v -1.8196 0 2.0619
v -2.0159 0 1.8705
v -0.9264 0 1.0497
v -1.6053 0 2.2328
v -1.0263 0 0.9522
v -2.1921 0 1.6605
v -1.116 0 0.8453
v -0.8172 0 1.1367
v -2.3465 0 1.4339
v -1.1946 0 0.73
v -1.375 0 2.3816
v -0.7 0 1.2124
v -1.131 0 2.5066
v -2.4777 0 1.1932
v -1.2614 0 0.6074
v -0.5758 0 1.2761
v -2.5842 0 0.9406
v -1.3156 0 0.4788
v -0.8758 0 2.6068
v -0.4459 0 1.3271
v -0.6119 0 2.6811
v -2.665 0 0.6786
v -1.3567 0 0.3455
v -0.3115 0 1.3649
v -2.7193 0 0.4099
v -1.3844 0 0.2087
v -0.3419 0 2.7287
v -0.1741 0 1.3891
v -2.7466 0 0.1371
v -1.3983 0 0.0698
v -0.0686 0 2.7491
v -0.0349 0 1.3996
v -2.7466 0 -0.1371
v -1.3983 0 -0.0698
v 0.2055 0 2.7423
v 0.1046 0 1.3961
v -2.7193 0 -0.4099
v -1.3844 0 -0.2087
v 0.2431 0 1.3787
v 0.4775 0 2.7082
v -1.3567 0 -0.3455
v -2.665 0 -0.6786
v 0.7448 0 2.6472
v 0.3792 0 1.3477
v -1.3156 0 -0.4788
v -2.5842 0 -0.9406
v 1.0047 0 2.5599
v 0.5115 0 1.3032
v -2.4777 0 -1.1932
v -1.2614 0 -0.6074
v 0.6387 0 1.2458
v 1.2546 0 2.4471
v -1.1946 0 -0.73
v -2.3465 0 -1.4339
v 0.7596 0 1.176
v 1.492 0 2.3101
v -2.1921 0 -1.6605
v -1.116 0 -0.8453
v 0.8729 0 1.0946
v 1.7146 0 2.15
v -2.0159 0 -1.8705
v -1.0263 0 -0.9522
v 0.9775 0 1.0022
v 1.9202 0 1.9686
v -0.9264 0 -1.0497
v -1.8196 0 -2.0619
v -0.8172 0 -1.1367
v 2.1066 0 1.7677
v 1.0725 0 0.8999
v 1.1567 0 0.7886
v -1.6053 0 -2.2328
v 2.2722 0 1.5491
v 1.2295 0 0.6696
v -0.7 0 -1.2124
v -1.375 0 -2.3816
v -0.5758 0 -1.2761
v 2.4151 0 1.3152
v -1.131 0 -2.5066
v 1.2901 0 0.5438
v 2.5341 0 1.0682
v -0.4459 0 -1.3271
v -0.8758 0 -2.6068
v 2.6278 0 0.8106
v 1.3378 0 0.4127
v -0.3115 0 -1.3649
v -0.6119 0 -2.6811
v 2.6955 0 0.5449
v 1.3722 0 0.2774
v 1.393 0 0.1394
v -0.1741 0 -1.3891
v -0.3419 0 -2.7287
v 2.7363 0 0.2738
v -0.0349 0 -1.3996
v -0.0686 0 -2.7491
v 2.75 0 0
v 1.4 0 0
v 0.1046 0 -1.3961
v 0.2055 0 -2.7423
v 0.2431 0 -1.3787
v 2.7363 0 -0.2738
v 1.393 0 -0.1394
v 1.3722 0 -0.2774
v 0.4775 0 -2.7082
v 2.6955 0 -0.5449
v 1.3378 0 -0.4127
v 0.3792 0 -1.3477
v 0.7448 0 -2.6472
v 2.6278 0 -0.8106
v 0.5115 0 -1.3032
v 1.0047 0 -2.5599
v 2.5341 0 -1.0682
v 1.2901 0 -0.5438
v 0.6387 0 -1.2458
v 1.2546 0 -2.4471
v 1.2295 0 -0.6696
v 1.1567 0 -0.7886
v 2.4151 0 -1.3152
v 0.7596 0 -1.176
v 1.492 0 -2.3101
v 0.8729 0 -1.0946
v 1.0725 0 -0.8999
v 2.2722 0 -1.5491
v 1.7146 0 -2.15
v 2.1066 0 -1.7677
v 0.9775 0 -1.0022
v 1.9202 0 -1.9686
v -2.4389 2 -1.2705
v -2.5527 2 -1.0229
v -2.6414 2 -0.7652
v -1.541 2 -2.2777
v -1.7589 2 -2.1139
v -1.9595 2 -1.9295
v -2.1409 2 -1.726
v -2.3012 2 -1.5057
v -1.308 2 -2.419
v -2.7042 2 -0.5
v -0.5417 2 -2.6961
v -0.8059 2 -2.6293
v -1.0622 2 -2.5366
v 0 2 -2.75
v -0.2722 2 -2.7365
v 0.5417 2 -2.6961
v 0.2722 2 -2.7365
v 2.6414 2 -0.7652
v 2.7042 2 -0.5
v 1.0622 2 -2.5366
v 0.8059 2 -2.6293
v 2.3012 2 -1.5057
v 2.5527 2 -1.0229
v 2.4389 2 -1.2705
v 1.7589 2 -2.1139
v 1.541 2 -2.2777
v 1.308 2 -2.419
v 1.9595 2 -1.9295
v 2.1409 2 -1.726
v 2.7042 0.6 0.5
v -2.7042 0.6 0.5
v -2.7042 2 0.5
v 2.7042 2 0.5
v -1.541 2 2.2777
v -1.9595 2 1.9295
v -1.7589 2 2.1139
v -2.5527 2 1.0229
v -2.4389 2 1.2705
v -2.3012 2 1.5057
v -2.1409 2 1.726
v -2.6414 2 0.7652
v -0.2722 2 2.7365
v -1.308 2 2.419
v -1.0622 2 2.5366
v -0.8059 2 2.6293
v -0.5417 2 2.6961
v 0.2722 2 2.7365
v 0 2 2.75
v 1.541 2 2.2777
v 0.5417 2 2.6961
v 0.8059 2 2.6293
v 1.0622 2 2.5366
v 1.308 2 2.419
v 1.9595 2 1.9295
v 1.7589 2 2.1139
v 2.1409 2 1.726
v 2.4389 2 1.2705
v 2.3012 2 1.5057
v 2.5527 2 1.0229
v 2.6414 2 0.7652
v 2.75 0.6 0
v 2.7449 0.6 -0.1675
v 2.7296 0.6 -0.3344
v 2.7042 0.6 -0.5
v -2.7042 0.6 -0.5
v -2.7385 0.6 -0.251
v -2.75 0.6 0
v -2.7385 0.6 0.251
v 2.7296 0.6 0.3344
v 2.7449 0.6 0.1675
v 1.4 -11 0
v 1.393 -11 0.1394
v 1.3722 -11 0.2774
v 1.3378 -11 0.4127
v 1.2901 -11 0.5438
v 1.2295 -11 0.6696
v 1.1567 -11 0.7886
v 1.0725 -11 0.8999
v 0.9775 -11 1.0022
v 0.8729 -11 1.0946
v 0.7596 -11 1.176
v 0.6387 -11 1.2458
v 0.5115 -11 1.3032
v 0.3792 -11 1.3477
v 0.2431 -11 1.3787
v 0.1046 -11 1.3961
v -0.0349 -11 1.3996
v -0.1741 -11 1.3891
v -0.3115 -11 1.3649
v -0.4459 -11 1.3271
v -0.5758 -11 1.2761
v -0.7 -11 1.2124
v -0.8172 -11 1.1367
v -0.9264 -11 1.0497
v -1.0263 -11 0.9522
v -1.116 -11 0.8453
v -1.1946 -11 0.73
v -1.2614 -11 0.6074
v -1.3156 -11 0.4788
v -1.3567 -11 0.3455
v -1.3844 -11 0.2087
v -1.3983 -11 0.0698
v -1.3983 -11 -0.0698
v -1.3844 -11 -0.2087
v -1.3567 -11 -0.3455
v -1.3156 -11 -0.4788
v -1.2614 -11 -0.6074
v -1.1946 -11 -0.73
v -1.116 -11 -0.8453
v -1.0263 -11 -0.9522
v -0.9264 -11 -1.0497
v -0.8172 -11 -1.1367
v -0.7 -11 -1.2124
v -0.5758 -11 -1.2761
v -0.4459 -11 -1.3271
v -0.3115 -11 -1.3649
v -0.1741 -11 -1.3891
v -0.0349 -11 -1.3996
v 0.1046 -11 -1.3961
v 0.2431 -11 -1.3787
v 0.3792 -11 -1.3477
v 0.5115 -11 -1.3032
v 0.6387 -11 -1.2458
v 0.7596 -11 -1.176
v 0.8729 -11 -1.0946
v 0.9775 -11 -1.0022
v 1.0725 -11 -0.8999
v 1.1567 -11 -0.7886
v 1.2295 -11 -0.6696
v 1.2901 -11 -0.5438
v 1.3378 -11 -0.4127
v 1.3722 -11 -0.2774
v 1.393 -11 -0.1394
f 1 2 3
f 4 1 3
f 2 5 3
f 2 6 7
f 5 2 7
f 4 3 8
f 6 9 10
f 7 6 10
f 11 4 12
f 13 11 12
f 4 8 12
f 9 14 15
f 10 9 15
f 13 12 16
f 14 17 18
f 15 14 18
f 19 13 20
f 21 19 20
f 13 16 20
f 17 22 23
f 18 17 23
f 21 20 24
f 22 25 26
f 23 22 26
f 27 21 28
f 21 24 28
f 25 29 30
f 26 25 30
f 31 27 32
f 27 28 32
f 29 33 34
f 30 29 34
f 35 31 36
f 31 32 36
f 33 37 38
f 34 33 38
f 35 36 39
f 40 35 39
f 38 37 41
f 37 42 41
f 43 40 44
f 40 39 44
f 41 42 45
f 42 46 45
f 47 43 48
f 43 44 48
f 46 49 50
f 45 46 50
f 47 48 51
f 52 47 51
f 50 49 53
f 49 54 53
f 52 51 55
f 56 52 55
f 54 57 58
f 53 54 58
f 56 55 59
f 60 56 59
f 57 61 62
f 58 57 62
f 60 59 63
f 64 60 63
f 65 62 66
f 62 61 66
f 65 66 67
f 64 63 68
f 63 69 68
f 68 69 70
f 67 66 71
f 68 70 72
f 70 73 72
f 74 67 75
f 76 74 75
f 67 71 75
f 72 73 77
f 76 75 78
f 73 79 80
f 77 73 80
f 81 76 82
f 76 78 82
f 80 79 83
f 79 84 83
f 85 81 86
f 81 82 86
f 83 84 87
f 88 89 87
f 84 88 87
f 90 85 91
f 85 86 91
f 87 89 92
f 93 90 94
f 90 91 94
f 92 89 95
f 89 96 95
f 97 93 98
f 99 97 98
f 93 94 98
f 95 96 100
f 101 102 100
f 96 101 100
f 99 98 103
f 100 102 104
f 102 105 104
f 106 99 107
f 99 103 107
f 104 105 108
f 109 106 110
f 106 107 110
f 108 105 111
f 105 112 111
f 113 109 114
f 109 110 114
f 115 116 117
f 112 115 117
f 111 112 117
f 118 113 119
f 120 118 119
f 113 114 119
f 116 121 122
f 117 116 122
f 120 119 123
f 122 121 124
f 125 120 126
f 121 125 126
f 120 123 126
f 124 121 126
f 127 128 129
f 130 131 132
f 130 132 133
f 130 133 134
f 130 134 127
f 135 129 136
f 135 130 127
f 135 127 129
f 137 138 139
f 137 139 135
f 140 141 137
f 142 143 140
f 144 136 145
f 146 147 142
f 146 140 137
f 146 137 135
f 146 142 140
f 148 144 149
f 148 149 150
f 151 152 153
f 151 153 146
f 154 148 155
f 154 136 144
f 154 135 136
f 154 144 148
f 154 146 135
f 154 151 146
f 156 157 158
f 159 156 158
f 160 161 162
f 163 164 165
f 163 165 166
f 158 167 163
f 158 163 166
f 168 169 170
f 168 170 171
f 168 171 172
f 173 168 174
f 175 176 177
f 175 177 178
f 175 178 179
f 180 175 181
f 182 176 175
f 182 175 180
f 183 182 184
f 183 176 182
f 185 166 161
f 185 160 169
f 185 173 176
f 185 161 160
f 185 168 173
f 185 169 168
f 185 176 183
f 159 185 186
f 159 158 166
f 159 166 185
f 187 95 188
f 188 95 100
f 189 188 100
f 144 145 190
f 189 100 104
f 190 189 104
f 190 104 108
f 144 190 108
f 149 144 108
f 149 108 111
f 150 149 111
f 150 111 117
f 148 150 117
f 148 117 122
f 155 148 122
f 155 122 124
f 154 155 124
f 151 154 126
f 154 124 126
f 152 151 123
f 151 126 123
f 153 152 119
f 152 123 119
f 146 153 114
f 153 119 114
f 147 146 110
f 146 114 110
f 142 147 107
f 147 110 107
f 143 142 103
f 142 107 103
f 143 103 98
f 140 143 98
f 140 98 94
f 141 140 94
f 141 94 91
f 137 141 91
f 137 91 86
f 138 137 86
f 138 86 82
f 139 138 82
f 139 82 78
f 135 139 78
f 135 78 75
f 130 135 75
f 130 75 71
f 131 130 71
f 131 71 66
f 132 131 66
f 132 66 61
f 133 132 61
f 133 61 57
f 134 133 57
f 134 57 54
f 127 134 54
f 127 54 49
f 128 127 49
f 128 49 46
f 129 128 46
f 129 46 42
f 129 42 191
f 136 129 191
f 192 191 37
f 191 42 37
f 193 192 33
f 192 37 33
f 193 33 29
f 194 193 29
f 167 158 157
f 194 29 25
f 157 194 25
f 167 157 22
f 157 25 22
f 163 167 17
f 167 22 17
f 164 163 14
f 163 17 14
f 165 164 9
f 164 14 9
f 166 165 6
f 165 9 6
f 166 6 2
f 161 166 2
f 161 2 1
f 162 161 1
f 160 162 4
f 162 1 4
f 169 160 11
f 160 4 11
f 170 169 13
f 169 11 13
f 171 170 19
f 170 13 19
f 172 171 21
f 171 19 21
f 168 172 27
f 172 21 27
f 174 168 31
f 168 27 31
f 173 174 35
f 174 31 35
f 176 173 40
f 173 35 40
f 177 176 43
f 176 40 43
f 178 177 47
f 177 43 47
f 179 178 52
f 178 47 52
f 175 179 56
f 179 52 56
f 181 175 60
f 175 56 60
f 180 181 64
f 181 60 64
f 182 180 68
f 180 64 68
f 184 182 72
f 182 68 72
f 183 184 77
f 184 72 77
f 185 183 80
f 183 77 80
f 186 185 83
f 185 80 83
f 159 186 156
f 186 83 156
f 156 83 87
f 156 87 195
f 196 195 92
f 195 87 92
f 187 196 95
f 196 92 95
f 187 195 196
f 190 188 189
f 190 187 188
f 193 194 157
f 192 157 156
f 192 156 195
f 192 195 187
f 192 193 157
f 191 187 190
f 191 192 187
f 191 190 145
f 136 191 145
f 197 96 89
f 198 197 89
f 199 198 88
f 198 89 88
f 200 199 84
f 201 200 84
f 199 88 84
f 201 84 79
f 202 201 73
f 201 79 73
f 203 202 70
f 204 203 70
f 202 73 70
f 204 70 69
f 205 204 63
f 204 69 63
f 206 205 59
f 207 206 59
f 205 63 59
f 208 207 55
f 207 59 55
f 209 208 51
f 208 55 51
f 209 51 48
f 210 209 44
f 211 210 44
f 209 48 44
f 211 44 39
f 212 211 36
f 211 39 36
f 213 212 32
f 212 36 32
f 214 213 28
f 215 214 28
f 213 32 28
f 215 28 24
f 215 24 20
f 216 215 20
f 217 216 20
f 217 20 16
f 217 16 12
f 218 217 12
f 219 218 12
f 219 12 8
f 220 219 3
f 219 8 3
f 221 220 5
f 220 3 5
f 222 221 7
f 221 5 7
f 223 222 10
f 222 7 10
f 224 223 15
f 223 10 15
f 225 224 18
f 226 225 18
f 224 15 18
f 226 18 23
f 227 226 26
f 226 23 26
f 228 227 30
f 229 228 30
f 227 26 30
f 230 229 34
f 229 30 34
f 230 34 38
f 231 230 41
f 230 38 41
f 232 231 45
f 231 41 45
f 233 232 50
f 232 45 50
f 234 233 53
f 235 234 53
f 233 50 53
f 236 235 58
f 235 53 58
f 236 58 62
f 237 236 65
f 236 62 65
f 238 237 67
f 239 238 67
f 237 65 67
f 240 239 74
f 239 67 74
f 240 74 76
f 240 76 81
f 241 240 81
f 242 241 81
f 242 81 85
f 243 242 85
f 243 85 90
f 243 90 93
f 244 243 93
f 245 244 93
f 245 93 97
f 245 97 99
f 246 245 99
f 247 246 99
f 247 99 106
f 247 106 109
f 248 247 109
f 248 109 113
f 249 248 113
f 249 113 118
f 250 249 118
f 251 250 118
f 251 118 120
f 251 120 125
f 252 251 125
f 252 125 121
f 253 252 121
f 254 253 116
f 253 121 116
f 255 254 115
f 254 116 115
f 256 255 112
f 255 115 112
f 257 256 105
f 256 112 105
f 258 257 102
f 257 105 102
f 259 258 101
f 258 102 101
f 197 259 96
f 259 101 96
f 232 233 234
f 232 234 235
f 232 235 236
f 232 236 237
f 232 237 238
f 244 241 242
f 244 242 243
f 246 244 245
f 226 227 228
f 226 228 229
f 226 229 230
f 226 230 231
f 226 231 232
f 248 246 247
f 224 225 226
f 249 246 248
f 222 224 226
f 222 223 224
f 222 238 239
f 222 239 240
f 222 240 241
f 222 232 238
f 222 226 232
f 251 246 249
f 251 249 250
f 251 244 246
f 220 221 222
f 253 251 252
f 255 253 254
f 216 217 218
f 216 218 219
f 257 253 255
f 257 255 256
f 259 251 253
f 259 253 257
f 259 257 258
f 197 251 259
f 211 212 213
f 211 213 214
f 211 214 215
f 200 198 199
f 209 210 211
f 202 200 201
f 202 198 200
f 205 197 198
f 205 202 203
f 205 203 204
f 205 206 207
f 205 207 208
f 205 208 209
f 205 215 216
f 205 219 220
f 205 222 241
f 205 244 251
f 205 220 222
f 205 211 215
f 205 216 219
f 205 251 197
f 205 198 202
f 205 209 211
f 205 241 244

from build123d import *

# Parameters (mm, degrees)
SKETCH1_R               = 2.75
BOSS_EXTRUDE1_DEPTH     = 2
SKETCH2_R               = 1.4
BOSS_EXTRUDE2_DEPTH     = 11
SKETCH3_W               = 1
SKETCH3_H               = 1.4
CUT_EXTRUDE1_DEPTH      = 3.75
CUT_EXTRUDE1_DEPTH_BACK = 3.75


with BuildPart() as part:
    # Sketch1 → Boss-Extrude1 (new body)
    with BuildSketch(Plane(origin=(0, 0, 0), x_dir=(1, 0, 0), z_dir=(0, 1, 0))):
        Circle(SKETCH1_R)
    extrude(amount=BOSS_EXTRUDE1_DEPTH)

    # Sketch2 → Boss-Extrude2 (add)
    with BuildSketch(Plane.XZ):
        Circle(SKETCH2_R)
    extrude(amount=BOSS_EXTRUDE2_DEPTH)

    # Sketch3 → Cut-Extrude1 (cut, two sides)
    with BuildSketch(Plane(origin=(0, 0, 0), x_dir=(0, 0, -1), z_dir=(1, 0, 0))) as cut_extrude1_sk:
        with Locations((0, 1.3)):
            Rectangle(SKETCH3_W, SKETCH3_H)
    extrude(amount=CUT_EXTRUDE1_DEPTH, mode=Mode.SUBTRACT)
    extrude(cut_extrude1_sk.sketch, amount=-CUT_EXTRUDE1_DEPTH_BACK, mode=Mode.SUBTRACT)


solid = part.part
